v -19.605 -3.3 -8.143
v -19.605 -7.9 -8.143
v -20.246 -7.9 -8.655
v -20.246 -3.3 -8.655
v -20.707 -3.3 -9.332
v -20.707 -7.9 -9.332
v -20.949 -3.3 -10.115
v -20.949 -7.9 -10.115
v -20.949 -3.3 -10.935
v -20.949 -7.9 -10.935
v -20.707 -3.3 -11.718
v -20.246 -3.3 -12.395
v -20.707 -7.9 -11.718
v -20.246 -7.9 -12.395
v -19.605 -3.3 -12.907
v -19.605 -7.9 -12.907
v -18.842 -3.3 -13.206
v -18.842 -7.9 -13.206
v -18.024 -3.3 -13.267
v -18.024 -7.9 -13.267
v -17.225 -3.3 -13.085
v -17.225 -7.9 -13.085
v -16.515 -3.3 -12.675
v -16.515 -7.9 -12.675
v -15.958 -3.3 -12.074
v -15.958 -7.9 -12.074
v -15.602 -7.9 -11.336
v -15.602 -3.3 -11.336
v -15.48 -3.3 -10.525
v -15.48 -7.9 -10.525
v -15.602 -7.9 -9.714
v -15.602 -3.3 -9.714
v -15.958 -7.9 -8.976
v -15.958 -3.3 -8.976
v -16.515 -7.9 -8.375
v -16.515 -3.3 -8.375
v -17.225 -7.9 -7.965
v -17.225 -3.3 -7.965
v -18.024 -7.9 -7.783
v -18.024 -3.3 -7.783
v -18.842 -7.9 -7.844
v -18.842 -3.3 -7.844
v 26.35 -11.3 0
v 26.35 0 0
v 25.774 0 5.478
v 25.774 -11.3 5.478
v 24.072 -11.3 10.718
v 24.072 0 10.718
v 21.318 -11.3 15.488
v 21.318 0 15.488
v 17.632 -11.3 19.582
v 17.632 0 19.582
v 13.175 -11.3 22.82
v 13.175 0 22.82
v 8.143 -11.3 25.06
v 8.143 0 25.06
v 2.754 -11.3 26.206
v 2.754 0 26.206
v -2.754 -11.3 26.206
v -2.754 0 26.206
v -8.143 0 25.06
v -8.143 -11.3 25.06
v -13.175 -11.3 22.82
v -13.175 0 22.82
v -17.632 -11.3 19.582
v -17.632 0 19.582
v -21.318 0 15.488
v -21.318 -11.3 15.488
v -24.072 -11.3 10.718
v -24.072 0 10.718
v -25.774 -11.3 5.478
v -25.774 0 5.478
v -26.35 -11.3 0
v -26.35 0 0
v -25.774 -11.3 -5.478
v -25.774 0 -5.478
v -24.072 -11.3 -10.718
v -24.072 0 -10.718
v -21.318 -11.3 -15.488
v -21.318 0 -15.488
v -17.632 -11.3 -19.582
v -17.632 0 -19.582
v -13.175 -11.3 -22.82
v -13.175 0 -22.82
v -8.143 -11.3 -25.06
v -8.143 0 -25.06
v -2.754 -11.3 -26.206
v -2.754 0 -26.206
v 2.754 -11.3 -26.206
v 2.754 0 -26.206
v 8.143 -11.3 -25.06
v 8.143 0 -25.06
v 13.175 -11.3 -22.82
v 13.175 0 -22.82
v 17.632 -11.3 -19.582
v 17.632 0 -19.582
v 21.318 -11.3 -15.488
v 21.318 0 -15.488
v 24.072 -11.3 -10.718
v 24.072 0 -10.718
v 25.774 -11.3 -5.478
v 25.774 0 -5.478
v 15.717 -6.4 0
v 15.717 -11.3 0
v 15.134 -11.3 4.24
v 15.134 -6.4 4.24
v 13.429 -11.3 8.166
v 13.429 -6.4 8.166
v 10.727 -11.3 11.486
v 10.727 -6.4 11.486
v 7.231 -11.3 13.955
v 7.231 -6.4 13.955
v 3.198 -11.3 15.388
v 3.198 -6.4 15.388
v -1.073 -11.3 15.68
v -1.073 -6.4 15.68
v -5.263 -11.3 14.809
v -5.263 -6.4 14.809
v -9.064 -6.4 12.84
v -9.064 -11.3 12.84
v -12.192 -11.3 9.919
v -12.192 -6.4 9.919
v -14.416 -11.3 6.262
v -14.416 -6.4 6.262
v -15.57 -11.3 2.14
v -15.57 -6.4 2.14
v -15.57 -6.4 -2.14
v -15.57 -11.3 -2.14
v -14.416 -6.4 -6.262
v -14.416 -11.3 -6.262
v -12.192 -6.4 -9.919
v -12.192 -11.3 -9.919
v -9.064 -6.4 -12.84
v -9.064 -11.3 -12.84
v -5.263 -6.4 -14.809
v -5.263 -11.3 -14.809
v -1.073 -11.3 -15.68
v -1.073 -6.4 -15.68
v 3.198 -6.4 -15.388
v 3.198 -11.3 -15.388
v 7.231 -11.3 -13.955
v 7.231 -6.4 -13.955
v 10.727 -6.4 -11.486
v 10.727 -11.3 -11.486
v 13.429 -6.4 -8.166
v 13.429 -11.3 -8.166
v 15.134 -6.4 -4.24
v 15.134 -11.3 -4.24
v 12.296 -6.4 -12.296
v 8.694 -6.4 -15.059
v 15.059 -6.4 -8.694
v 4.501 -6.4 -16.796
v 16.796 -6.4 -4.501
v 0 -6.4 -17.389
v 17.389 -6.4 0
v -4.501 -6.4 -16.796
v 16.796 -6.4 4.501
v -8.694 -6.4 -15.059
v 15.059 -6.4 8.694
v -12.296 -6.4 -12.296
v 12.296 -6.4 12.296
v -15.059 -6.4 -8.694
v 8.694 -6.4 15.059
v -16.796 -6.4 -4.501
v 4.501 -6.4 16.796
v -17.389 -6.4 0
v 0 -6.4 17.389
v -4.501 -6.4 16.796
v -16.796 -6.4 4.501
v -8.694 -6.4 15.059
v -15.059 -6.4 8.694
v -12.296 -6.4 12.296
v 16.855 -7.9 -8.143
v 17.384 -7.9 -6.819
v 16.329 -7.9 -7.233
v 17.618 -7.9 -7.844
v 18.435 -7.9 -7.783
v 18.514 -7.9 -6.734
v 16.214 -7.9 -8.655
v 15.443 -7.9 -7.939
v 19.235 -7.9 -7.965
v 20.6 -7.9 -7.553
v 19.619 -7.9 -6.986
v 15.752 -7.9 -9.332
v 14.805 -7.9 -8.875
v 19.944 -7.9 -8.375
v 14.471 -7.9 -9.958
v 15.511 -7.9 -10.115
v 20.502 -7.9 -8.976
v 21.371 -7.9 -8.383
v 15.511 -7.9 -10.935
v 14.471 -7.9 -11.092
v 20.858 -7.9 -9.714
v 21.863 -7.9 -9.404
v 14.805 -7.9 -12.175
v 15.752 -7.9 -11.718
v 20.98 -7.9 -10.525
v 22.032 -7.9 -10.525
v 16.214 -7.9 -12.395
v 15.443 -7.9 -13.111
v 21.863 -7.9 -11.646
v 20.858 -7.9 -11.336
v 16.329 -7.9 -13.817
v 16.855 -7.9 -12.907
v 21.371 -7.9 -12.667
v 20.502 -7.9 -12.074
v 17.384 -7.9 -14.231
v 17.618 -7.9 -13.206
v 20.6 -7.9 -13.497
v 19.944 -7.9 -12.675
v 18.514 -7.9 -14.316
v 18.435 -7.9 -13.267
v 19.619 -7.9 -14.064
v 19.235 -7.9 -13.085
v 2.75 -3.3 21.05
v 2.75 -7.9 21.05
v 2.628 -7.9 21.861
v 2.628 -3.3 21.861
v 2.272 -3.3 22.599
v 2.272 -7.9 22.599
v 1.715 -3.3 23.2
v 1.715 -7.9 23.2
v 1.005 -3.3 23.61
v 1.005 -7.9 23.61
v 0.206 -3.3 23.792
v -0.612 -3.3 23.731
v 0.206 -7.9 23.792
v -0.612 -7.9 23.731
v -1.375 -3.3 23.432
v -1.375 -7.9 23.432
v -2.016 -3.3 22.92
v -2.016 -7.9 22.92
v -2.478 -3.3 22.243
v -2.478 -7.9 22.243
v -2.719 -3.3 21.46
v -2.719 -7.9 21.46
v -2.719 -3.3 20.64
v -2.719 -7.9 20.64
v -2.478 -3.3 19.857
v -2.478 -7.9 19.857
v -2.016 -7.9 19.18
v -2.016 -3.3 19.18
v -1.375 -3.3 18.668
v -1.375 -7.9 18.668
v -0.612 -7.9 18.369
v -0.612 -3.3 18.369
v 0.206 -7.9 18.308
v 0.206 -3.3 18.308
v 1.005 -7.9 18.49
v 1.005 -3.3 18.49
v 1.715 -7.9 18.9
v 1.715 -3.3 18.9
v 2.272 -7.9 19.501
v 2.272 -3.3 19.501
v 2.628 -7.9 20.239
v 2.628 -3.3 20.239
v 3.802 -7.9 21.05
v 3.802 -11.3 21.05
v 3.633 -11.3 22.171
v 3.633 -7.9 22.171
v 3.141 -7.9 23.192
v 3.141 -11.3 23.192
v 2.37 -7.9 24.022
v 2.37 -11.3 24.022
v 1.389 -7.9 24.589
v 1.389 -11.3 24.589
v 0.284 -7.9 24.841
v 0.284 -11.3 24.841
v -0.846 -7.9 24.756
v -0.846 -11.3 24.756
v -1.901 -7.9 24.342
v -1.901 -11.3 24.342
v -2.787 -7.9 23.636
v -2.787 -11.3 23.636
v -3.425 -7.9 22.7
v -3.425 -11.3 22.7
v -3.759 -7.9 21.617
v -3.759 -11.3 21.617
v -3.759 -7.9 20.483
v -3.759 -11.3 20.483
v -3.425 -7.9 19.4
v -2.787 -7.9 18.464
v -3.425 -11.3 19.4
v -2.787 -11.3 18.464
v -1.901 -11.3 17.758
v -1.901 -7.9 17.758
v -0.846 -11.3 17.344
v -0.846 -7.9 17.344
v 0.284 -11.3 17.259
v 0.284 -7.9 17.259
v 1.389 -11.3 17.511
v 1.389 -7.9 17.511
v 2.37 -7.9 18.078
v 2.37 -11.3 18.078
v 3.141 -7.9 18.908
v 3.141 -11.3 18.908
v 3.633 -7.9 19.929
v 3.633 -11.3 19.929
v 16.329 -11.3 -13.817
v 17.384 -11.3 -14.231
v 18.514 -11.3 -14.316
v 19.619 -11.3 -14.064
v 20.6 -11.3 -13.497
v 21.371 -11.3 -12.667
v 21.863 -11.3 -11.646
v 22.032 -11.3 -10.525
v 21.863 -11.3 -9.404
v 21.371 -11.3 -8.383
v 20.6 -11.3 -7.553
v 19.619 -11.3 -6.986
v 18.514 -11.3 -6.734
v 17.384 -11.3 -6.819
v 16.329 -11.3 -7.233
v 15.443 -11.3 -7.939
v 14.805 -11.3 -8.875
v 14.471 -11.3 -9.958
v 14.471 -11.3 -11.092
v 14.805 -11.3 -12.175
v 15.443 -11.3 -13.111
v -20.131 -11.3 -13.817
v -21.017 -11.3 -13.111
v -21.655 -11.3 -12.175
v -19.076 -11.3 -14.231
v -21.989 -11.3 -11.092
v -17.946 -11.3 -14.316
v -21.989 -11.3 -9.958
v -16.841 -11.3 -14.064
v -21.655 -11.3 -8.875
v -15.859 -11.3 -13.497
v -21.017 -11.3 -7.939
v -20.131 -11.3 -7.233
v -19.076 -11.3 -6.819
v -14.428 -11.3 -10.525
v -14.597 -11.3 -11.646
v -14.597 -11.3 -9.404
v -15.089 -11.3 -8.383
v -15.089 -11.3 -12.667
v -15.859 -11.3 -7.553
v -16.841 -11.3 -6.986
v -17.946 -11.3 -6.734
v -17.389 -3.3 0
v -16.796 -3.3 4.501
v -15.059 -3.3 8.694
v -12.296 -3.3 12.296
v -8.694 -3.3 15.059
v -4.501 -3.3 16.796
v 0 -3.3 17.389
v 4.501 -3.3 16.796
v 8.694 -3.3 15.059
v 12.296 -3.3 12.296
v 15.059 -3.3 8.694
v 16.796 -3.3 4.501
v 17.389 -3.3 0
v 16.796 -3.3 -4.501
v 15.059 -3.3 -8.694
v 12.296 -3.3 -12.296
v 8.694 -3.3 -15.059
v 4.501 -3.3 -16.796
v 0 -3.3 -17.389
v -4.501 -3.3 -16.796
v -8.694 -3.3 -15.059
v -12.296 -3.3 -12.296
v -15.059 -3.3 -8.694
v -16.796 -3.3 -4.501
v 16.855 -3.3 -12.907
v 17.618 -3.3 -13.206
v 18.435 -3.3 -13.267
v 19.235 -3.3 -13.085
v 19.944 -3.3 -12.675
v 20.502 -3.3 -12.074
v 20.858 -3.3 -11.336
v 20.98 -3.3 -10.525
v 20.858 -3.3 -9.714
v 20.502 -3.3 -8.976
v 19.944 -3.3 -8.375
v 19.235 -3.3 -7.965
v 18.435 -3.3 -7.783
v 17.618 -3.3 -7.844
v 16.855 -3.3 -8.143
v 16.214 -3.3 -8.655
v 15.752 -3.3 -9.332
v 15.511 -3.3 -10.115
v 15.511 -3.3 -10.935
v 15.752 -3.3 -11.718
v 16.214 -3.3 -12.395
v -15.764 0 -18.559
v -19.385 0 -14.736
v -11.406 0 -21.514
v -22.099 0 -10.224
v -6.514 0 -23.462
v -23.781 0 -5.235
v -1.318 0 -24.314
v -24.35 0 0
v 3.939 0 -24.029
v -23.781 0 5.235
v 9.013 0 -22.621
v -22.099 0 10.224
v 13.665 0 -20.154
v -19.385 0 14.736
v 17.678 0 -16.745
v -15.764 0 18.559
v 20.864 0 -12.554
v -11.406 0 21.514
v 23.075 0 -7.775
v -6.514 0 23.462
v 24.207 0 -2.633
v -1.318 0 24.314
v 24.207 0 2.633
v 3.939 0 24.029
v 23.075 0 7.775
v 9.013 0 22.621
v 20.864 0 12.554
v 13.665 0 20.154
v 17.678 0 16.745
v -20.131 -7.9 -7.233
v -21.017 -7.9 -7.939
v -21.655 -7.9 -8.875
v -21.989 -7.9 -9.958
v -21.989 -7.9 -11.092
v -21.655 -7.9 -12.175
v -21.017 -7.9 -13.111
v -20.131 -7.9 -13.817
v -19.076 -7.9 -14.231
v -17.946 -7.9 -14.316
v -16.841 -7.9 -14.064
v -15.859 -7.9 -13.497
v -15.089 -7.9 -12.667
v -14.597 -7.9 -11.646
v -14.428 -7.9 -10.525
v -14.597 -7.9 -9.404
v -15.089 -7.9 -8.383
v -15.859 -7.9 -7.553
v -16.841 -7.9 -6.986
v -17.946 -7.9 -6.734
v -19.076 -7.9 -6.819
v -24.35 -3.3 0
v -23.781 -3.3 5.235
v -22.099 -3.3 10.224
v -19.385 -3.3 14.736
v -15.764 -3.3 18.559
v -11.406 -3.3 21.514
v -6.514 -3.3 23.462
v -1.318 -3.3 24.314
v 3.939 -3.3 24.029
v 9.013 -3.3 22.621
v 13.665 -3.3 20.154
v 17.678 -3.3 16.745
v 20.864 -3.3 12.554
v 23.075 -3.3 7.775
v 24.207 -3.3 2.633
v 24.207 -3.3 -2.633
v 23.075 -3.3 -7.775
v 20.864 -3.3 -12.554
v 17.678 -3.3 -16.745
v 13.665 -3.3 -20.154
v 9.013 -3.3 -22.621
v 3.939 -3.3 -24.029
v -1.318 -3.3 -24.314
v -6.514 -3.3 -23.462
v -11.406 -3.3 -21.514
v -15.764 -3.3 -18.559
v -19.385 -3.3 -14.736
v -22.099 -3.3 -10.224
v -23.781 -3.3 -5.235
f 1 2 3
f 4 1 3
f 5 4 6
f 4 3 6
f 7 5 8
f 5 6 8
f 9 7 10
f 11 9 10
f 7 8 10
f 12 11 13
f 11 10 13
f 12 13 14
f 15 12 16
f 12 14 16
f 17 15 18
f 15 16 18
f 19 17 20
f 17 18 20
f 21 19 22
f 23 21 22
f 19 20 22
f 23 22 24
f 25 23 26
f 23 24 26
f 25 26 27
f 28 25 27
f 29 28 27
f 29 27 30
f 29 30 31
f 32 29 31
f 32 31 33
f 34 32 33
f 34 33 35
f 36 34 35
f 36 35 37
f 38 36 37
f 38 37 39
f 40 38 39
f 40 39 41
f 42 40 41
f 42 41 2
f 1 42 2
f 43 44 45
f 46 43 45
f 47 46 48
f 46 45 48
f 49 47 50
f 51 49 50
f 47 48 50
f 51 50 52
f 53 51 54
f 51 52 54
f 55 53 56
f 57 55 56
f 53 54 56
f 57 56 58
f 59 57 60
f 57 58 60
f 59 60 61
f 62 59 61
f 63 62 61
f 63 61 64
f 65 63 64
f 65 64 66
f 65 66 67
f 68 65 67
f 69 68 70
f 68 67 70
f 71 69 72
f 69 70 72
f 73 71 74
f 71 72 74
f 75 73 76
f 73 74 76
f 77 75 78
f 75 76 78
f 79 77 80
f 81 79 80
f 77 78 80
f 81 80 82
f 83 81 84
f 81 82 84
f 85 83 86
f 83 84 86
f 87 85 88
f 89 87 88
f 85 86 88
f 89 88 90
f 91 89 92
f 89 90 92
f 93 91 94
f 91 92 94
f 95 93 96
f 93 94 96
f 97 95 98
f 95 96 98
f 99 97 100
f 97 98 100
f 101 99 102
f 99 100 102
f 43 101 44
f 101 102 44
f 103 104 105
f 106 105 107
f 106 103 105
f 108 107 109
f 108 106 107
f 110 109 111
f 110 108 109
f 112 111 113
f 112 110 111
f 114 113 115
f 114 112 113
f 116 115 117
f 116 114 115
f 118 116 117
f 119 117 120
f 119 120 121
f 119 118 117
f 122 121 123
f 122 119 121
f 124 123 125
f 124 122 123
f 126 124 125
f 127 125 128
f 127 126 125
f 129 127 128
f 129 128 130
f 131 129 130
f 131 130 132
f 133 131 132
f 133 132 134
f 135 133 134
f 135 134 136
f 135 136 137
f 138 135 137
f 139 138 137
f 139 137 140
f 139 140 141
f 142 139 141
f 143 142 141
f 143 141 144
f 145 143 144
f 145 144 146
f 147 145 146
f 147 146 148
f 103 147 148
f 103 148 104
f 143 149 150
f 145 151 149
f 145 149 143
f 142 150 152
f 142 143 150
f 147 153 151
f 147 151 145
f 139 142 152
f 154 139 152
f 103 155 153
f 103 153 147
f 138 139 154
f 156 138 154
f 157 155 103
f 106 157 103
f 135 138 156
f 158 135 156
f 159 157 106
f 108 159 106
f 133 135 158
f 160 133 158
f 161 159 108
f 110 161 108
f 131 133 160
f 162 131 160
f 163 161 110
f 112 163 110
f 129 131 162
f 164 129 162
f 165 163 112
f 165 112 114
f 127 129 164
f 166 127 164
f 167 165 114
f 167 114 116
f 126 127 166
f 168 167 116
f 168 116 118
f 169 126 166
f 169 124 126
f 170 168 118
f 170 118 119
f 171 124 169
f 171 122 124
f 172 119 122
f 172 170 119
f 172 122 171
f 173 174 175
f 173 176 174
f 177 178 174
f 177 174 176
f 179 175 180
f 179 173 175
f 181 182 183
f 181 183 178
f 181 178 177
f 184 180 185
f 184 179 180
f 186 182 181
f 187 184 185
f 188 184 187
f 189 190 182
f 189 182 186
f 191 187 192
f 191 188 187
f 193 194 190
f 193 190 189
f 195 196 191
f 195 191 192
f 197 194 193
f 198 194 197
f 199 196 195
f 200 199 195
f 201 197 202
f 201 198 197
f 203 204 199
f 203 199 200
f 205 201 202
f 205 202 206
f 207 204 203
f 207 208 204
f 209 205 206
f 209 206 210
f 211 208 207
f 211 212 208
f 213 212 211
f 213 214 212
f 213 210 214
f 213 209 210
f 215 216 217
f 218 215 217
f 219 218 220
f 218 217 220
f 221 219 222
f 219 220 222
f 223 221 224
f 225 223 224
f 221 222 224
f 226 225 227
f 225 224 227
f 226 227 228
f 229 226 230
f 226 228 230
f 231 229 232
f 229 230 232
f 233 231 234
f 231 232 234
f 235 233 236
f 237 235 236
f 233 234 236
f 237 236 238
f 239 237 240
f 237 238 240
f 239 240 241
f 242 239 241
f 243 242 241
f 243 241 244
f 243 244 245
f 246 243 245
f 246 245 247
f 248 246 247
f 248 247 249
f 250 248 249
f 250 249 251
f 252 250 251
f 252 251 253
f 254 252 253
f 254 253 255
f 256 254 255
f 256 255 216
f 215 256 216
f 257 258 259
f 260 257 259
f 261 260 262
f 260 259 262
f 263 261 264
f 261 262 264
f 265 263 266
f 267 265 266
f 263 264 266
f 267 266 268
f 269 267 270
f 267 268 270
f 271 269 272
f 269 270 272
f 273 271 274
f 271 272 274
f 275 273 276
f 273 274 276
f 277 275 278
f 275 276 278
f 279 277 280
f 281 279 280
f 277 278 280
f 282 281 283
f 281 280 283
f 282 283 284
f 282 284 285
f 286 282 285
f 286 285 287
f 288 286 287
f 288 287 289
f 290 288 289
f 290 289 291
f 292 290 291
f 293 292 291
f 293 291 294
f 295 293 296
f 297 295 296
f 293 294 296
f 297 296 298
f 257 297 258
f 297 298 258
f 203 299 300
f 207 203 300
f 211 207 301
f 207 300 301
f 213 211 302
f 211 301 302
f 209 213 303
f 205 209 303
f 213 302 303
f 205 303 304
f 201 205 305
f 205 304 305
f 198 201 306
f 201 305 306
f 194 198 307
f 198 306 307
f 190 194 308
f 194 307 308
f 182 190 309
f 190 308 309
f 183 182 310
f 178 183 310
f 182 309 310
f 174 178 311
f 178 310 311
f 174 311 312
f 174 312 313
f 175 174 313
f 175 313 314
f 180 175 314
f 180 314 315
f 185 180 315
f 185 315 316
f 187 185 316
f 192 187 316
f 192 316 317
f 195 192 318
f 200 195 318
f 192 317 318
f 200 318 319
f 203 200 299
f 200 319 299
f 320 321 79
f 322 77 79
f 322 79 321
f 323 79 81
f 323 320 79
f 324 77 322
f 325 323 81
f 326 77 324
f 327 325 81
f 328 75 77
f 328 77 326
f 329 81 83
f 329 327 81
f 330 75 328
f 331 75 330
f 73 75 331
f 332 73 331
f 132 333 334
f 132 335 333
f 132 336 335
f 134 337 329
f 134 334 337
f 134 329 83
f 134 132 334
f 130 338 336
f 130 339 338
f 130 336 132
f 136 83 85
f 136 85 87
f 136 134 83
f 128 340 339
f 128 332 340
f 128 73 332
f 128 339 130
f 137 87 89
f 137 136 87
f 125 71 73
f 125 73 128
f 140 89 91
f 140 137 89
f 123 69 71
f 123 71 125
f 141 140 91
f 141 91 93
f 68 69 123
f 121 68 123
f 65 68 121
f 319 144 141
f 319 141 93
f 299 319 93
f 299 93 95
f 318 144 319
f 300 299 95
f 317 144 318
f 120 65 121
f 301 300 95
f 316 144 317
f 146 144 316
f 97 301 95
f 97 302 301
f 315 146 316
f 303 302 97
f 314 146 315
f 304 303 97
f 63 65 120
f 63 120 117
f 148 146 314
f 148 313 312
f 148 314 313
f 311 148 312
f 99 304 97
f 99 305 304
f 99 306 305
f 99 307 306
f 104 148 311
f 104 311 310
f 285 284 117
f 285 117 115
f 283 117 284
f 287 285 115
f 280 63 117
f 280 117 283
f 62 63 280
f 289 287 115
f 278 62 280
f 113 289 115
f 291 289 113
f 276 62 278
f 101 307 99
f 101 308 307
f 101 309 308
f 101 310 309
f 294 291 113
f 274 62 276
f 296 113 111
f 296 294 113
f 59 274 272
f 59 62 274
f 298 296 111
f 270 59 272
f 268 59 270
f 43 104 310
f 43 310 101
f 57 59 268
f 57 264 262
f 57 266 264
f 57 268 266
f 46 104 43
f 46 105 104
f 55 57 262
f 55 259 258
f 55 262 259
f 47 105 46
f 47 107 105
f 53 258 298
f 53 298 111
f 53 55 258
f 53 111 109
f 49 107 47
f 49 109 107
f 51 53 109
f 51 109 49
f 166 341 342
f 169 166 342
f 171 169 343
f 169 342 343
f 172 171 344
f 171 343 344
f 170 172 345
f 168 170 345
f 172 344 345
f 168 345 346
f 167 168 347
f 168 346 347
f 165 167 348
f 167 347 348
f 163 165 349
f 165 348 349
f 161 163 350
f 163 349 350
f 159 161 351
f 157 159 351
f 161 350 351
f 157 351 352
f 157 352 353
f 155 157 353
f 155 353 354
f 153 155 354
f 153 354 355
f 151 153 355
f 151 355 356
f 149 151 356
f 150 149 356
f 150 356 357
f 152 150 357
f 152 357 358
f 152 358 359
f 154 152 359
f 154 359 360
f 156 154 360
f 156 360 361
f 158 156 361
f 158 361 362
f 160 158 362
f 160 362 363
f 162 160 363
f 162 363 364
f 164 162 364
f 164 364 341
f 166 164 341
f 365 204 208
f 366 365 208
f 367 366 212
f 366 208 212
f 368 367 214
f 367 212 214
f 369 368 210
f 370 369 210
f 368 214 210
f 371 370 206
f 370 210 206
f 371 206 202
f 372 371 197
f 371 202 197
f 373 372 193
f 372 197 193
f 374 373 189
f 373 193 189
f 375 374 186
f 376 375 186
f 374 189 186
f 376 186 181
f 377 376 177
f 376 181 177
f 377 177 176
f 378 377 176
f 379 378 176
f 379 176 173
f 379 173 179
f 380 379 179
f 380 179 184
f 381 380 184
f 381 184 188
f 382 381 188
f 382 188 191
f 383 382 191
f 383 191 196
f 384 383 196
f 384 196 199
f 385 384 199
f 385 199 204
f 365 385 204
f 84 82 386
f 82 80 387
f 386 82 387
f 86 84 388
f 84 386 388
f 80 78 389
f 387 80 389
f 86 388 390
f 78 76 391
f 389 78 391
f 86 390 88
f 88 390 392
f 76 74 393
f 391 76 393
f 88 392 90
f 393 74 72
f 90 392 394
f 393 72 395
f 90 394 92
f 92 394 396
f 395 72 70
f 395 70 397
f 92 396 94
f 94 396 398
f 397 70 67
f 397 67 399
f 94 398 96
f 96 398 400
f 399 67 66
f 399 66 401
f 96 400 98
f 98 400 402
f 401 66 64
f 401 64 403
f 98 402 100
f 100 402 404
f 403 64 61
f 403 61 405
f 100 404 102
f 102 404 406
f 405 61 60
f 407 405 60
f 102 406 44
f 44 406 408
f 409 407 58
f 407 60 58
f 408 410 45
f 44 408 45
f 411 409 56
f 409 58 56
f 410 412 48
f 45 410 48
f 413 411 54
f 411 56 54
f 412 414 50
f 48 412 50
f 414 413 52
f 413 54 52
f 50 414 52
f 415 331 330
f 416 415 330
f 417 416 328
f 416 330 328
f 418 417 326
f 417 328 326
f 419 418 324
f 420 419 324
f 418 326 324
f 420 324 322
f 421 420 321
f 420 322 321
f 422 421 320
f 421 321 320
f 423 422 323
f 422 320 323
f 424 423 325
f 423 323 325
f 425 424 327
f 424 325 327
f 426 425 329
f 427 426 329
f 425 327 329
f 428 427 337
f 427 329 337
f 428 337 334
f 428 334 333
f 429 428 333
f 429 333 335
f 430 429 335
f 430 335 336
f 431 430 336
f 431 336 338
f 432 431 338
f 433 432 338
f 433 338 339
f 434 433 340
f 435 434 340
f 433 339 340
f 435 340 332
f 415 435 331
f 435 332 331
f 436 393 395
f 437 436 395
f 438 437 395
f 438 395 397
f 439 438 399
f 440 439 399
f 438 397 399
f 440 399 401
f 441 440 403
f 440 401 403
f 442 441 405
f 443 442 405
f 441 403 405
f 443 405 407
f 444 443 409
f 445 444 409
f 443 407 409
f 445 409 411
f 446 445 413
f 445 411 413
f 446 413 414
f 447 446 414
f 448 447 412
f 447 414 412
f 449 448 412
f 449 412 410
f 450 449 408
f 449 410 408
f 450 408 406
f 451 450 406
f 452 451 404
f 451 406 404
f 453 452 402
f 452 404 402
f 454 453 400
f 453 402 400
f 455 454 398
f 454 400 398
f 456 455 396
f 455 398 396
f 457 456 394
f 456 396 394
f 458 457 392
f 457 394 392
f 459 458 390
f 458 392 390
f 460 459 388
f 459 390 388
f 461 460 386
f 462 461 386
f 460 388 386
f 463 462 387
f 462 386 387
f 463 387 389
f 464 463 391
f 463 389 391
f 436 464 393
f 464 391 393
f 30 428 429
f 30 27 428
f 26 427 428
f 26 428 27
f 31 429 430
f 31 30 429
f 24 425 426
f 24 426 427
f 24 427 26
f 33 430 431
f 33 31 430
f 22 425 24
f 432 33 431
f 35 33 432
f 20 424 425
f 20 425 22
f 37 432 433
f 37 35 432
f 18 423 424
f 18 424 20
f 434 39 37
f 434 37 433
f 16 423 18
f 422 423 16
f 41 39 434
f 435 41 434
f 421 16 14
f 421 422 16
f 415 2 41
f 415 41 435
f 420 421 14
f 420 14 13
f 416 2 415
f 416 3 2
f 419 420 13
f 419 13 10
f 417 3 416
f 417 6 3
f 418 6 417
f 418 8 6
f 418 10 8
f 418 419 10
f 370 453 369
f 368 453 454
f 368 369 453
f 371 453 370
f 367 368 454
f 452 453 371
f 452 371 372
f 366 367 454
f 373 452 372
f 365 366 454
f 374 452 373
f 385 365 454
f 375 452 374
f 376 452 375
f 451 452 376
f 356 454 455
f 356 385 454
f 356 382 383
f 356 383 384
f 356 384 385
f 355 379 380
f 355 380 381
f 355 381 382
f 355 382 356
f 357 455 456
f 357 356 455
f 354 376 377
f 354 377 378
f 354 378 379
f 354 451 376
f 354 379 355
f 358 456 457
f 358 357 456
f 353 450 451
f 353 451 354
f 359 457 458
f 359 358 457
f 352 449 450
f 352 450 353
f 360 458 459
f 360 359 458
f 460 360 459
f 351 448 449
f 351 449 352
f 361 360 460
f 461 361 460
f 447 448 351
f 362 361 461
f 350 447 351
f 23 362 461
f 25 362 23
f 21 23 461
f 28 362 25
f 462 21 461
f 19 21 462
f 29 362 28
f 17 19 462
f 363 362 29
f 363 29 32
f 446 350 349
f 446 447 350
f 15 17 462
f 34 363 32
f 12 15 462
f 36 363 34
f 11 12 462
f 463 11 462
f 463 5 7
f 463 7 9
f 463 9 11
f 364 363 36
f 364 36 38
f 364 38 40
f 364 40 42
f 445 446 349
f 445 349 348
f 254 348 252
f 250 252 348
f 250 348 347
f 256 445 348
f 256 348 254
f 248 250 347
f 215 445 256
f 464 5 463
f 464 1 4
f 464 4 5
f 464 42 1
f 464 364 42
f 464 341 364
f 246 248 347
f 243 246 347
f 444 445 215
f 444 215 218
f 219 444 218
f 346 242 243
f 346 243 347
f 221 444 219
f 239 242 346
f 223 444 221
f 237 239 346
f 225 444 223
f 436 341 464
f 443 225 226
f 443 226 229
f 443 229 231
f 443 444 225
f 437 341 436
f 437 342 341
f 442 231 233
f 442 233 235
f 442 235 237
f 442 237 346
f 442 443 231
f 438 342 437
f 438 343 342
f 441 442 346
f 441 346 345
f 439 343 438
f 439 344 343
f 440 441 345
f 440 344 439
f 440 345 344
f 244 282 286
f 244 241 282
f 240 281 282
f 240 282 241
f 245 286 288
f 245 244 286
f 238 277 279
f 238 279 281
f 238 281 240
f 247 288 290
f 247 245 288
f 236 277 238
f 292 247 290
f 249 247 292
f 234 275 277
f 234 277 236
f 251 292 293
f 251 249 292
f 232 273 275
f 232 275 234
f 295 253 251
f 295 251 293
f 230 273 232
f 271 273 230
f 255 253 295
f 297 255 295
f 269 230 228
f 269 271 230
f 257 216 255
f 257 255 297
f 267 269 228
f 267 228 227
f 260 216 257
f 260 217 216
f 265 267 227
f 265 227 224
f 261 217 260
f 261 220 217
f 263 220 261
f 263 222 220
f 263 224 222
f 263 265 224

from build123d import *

# Parameters (mm, degrees)
F0_R            = 26.35
F0_R_2          = 15.7166947943
F1_DEPTH        = 11.3
F2_R            = 17.3887467131
F2_R_2          = 15.7166947943
F3_DEPTH        = 6.4
F4_R            = 24.35
F4_R_2          = 17.3887467131
F5_DEPTH        = 3.3
F6_R            = 3.8017714644
F6_R_2          = 2.75
F7_DEPTH        = 3.4
F7_COPIES_COUNT = 3
F8_DEPTH        = 10
F8_COPIES_COUNT = 3


# Not quite as in the source:
# - a feature of the source that left no trace in its solid (it failed there, or was rolled back) is left out
# - a pattern or mirror of a feature is missing from the dataset's text; its kind, count and spacing are read off the source's solid


with BuildPart() as f1:
    # F0 (on Front) → F1 (new body)
    with BuildSketch(Plane.XZ):
        Circle(F0_R)
        Circle(F0_R_2, mode=Mode.SUBTRACT)
    extrude(amount=F1_DEPTH)

    # F2 (on face) → F3 (cut)
    with BuildSketch(Plane(origin=(0, 0, 0), x_dir=(-1, 0, 0), z_dir=(0, 1, 0))):
        Circle(F2_R)
        Circle(F2_R_2, mode=Mode.SUBTRACT)
    extrude(amount=-F3_DEPTH, mode=Mode.SUBTRACT)

    # F4 (on face) → F5 (cut)
    with BuildSketch(Plane(origin=(0, 0, 0), x_dir=(-1, 0, 0), z_dir=(0, 1, 0))):
        Circle(F4_R)
        Circle(F4_R_2, mode=Mode.SUBTRACT)
    extrude(amount=-F5_DEPTH, mode=Mode.SUBTRACT)

    # F6 (on face) → F7 (cut)
    with BuildSketch(Plane.XZ.offset(11.3)):
        with Locations((0, 21.05)):
            Circle(F6_R)
        with Locations((0, 21.05)):
            Circle(F6_R_2, mode=Mode.SUBTRACT)
    f7 = extrude(amount=-F7_DEPTH, mode=Mode.SUBTRACT)

    # F7_copies: F7 ×3 about axis
    f7_copies_axis = Axis((0, 0, 0), (0, 1, 0))
    for i in range(1, F7_COPIES_COUNT):
        add(f7.rotate(f7_copies_axis, i * 360 / F7_COPIES_COUNT), mode=Mode.SUBTRACT)

    # F8 (cut): a face of the model
    f8_faces = [f1.faces().sort_by_distance(p)[0] for p in [
        (0, -11.3, 21.05),
    ]]
    f8 = extrude(f8_faces, amount=-F8_DEPTH, mode=Mode.SUBTRACT)

    # F8_copies: F8 ×3 about axis
    f8_copies_axis = Axis((0, 0, 0), (0, 1, 0))
    for i in range(1, F8_COPIES_COUNT):
        add(f8.rotate(f8_copies_axis, i * 360 / F8_COPIES_COUNT), mode=Mode.SUBTRACT)


solid = f1.part
